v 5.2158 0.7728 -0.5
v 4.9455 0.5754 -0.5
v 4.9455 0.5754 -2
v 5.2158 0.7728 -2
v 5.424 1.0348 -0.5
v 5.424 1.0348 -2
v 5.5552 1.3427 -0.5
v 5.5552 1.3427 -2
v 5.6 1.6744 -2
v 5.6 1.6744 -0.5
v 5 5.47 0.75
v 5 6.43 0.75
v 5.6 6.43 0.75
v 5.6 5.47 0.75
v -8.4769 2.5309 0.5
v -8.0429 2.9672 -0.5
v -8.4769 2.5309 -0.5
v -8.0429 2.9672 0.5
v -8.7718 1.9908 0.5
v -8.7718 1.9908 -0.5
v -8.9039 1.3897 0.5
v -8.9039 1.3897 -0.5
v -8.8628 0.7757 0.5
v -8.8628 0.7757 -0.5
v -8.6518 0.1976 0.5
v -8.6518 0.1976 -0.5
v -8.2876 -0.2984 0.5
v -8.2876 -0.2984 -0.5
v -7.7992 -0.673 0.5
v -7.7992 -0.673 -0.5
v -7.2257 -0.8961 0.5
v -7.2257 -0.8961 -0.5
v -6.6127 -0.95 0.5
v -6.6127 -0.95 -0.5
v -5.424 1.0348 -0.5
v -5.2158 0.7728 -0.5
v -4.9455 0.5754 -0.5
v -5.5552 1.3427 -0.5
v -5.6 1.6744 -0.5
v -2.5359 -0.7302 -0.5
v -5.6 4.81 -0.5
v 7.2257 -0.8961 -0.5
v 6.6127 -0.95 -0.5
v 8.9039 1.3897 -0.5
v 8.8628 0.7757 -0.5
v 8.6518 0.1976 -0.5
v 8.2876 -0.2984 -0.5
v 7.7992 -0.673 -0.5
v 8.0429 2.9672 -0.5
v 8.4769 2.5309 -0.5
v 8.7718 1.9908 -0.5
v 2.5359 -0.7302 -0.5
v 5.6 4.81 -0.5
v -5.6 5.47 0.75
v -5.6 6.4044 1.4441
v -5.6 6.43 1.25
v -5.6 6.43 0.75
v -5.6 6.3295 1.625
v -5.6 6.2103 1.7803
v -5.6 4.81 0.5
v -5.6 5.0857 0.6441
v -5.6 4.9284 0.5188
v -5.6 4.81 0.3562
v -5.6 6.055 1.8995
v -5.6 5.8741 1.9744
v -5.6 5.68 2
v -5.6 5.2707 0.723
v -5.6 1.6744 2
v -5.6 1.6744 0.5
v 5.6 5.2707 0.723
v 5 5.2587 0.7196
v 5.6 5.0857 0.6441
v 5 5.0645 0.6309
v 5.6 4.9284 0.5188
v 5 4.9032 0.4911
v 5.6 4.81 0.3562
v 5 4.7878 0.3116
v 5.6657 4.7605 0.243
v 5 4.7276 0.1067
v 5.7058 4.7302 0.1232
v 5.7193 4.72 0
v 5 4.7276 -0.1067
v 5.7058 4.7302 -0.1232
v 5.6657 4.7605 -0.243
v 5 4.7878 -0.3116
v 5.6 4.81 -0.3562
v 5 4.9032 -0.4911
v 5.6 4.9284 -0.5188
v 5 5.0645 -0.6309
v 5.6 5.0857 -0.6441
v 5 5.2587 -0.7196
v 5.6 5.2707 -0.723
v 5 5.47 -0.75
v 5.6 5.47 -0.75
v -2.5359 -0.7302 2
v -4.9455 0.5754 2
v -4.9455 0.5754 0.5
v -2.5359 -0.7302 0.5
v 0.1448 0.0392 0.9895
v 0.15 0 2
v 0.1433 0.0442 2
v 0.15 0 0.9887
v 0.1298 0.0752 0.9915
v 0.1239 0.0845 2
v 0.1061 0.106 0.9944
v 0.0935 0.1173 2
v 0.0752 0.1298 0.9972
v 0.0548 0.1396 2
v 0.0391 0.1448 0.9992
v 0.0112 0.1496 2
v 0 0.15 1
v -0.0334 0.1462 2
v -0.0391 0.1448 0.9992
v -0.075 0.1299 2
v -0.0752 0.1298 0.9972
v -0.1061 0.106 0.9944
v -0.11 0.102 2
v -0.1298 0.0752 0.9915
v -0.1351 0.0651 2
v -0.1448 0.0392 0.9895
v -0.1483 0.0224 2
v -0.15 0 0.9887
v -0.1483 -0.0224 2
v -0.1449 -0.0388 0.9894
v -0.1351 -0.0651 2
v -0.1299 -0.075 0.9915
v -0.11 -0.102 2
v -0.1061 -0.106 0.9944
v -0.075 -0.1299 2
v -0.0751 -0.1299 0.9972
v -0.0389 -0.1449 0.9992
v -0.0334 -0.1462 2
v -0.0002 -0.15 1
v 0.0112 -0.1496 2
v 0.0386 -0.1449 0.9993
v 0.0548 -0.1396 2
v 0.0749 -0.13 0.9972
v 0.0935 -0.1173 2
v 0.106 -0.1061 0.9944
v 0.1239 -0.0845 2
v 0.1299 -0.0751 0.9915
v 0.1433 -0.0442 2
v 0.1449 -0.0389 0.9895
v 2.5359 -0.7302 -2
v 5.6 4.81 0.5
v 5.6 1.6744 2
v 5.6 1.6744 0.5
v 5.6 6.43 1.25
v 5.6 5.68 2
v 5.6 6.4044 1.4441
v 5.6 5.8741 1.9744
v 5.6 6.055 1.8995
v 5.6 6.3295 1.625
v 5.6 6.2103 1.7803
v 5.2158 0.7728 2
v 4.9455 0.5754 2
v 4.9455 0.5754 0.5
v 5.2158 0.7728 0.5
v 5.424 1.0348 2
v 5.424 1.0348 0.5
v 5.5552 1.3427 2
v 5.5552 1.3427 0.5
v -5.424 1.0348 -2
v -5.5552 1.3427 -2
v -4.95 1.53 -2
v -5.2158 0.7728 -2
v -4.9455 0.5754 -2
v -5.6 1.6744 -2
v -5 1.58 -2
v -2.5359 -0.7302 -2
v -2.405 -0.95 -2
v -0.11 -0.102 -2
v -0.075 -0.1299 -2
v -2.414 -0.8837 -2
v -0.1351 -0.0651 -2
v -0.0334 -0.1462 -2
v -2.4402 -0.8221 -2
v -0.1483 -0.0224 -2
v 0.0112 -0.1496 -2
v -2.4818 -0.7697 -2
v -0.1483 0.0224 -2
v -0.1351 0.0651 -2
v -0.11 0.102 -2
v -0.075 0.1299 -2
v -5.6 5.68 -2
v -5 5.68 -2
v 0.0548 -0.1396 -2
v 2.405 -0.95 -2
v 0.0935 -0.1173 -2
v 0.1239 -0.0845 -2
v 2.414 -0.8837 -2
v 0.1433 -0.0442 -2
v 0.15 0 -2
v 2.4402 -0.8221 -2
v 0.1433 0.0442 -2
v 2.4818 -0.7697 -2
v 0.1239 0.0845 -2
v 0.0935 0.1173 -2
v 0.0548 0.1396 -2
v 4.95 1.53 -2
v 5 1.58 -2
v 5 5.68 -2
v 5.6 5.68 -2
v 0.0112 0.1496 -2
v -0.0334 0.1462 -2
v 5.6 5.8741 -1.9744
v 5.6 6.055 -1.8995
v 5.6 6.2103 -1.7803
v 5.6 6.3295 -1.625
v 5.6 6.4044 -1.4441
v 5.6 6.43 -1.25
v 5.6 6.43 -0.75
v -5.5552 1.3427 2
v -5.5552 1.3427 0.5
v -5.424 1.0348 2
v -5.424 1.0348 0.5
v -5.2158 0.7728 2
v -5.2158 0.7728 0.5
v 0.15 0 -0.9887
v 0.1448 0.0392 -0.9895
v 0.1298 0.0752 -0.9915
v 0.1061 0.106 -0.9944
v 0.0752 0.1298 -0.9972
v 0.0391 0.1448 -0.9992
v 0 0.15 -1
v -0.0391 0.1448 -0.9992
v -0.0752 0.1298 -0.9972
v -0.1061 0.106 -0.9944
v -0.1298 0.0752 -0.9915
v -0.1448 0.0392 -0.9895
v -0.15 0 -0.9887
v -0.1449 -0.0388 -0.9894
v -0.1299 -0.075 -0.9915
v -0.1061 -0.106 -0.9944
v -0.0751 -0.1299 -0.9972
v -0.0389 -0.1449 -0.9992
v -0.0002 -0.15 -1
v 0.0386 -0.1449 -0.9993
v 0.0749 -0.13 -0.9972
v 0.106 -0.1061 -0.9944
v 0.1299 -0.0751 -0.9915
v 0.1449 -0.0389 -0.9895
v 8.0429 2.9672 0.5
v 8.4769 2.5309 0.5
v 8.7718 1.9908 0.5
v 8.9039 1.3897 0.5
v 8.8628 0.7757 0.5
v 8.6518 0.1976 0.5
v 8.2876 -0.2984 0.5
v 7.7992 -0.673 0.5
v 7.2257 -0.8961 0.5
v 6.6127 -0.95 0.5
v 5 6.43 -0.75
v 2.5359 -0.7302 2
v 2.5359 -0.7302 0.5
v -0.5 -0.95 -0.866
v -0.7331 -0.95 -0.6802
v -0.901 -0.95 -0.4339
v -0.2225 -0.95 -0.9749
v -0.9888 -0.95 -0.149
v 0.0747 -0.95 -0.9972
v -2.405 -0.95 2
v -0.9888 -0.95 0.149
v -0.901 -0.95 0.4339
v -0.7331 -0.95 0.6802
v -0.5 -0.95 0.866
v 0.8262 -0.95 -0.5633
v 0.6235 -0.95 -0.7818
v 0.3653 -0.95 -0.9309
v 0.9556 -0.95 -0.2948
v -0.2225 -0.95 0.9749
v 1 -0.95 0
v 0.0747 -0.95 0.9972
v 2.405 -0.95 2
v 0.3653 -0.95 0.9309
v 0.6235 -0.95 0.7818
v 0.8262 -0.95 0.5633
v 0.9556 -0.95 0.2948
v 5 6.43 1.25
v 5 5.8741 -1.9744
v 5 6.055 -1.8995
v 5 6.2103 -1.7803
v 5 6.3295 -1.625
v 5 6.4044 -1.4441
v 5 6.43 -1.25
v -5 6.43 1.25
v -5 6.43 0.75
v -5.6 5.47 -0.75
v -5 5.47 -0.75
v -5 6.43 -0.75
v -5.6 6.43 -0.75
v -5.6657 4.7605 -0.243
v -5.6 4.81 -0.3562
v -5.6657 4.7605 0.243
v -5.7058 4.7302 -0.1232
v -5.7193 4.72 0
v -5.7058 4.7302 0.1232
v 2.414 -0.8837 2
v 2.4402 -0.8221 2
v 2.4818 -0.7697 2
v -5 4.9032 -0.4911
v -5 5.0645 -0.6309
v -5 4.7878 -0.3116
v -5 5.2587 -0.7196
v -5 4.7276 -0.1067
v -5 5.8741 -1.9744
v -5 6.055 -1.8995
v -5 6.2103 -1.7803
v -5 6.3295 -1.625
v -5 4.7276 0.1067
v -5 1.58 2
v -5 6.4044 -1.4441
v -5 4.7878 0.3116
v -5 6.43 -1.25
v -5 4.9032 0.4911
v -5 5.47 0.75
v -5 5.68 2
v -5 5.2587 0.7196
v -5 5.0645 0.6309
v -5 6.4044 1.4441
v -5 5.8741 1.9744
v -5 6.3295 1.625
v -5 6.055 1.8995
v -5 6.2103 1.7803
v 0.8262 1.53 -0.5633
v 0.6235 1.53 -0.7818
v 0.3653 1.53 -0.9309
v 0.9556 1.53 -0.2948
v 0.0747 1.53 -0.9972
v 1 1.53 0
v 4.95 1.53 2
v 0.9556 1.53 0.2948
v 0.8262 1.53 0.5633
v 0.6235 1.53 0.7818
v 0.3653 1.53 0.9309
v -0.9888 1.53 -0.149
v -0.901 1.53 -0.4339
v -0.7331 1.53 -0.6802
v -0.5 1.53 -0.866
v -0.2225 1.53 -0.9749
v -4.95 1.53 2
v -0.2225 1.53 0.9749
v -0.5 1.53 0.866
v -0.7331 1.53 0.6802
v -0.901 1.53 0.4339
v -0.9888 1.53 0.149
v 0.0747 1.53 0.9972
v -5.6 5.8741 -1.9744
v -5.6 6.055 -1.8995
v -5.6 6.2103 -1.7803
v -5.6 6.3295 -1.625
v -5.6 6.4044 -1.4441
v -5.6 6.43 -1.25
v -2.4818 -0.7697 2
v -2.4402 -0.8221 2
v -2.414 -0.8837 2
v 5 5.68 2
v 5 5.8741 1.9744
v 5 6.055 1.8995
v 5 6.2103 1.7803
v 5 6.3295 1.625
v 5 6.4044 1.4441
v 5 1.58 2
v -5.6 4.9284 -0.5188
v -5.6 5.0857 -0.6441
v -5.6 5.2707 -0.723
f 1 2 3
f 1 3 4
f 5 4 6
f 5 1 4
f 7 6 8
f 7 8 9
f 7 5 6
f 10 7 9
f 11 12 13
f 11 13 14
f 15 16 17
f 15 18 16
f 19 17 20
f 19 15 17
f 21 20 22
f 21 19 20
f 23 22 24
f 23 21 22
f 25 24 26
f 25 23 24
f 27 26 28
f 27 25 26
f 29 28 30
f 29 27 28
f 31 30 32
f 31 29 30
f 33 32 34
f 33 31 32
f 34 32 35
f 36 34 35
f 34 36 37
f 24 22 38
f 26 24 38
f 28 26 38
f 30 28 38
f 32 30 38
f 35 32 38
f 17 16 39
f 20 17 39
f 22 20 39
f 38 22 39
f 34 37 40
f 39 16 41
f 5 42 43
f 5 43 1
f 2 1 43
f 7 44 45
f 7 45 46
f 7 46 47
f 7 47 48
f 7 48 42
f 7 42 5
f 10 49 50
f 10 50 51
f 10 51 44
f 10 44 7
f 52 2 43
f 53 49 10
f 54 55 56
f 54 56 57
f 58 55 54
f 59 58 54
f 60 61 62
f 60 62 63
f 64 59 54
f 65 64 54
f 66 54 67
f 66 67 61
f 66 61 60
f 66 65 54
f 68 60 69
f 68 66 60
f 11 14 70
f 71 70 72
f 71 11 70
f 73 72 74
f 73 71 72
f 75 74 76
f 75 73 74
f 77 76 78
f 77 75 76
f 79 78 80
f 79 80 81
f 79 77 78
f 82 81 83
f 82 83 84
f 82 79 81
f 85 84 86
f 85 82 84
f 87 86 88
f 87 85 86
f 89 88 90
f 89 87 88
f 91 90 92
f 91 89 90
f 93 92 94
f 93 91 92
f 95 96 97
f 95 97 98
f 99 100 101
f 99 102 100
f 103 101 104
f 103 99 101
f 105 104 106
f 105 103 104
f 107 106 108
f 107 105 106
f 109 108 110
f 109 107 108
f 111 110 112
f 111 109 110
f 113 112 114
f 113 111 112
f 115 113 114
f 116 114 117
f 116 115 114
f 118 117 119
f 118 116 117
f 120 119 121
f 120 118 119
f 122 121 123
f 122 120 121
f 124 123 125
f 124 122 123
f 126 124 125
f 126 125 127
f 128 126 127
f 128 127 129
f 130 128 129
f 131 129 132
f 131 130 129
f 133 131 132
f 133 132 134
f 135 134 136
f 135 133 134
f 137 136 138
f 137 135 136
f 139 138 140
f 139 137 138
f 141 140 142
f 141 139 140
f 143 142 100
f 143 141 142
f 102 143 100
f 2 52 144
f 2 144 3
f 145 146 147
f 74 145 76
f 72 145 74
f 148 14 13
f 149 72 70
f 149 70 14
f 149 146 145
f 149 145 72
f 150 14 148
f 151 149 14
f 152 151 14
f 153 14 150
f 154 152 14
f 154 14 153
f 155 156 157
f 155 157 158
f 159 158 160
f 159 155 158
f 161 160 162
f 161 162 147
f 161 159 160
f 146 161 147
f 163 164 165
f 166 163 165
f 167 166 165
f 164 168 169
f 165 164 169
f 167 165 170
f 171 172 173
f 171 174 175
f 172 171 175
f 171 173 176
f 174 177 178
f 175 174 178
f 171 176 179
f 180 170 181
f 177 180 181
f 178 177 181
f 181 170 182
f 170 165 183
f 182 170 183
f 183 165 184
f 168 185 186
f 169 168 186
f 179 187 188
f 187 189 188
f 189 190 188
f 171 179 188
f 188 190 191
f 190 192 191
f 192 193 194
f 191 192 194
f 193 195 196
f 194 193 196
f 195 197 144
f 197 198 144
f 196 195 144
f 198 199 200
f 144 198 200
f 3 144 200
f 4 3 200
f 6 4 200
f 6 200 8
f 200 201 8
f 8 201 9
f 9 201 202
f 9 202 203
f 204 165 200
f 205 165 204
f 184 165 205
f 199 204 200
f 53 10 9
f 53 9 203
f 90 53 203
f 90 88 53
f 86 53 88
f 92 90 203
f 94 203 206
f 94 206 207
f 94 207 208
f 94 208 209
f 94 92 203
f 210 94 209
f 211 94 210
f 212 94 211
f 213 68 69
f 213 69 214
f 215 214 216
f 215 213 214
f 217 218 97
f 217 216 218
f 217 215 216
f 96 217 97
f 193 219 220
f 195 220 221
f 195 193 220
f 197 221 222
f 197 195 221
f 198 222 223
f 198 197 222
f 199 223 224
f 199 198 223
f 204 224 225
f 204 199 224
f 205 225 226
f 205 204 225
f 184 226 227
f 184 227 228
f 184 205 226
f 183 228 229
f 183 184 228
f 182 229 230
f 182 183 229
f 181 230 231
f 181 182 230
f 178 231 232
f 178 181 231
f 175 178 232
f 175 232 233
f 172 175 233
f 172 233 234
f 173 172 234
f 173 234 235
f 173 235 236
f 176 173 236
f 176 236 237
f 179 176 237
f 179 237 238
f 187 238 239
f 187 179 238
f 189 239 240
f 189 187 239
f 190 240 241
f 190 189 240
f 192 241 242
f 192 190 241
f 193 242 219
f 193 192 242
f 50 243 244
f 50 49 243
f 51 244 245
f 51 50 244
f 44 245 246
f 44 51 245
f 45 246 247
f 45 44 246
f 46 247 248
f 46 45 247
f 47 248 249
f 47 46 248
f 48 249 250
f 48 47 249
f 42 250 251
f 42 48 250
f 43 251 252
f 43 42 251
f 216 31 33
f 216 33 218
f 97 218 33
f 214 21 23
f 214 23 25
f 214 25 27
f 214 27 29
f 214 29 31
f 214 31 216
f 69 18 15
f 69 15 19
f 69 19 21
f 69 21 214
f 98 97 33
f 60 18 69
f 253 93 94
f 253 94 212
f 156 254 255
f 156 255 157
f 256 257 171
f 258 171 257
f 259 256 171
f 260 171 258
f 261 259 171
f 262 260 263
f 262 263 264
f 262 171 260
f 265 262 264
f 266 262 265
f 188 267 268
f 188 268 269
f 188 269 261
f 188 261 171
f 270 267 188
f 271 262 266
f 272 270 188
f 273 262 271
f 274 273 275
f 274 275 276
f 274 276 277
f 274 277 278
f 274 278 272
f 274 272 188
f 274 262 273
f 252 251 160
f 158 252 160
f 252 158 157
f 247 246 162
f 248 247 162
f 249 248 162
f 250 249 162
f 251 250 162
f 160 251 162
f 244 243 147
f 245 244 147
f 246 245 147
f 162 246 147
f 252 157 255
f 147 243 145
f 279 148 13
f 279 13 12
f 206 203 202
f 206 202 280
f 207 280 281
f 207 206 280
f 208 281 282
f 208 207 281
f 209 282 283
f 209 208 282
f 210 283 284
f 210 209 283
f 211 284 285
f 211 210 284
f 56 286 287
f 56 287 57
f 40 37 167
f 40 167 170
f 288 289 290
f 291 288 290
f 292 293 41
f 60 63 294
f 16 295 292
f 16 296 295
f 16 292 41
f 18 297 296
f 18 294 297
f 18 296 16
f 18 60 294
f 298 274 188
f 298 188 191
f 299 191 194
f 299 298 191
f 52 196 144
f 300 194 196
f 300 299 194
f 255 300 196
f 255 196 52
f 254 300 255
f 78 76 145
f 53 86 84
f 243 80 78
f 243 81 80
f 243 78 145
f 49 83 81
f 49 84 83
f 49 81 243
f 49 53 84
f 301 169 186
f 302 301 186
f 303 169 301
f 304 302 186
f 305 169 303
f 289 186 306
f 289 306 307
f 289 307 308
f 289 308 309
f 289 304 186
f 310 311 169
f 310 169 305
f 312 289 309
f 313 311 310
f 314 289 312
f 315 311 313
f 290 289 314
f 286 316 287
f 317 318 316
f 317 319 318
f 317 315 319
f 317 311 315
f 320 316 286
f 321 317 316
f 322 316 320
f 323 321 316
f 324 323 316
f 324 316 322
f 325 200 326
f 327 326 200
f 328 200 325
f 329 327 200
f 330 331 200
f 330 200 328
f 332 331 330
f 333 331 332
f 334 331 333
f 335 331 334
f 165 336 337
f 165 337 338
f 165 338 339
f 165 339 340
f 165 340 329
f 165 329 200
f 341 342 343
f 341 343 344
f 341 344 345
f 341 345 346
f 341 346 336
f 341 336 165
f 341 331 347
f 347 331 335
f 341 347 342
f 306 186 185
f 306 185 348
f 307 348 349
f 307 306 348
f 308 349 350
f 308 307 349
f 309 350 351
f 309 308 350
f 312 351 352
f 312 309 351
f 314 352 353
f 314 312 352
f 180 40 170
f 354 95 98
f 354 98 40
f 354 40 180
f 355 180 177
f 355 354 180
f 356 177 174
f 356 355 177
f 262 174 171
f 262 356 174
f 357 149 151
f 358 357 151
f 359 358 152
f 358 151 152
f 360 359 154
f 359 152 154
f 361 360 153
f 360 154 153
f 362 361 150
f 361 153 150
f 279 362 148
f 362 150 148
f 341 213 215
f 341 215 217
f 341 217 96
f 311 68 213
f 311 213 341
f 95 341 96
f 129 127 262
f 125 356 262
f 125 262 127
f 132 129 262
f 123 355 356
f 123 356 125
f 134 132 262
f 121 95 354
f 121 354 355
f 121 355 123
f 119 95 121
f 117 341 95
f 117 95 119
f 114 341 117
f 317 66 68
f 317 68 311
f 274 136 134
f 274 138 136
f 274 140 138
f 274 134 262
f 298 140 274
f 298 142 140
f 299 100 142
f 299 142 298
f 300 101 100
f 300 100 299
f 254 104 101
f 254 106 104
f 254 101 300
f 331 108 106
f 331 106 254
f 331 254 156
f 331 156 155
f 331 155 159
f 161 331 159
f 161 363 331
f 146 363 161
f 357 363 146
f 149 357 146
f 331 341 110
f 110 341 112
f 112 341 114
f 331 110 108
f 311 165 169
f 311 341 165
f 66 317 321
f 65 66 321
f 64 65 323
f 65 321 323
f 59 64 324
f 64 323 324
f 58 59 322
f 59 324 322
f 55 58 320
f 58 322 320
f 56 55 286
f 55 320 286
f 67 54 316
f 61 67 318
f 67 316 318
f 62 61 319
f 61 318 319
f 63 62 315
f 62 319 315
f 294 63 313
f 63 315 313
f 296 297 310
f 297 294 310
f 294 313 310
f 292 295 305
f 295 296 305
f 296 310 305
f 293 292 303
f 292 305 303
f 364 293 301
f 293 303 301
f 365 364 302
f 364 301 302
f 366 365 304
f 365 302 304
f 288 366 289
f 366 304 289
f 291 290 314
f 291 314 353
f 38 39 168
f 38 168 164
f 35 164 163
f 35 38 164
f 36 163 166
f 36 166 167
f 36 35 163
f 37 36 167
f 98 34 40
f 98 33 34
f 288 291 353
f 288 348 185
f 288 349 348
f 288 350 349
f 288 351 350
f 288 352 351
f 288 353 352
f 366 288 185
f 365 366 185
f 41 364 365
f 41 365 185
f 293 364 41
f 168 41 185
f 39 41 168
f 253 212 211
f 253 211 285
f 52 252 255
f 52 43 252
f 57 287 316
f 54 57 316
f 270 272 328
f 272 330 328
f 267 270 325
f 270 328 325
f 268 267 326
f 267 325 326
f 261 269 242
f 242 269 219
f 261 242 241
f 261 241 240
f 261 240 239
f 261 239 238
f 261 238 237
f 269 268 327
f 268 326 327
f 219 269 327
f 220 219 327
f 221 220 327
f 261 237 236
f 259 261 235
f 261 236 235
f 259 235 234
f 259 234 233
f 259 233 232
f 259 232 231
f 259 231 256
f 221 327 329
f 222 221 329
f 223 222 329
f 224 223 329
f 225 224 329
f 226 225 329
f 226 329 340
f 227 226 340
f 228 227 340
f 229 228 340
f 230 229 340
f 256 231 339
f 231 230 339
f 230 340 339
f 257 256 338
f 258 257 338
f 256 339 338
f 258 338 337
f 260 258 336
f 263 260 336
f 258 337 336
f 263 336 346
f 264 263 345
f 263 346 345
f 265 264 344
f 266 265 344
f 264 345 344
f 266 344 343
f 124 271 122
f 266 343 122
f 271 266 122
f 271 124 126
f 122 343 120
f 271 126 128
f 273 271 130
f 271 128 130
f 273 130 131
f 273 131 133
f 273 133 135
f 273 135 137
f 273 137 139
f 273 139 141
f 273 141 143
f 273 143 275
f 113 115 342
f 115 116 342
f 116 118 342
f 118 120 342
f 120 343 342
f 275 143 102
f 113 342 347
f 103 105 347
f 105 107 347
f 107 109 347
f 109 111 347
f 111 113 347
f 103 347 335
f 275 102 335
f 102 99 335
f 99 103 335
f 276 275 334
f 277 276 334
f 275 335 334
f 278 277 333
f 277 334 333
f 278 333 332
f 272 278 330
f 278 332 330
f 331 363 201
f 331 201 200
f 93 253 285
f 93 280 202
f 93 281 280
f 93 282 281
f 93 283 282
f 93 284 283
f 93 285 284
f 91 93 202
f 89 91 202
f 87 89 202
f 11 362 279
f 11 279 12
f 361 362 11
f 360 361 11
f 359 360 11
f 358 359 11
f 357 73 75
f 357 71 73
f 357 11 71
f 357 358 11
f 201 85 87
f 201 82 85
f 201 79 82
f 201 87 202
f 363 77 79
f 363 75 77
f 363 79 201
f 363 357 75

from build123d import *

# Parameters (mm, degrees)
SKETCH1_R               = 0.15
BOSS_EXTRUDE1_DEPTH     = 2
BOSS_EXTRUDE3_DEPTH     = 0.5
CUT_EXTRUDE1_DEPTH      = 9.910022596
CUT_EXTRUDE1_DEPTH_BACK = 9.910022596
CUT_EXTRUDE2_DEPTH      = 4.310022596
CUT_EXTRUDE2_DEPTH_BACK = 15.510022596
SKETCH6_R               = 1
CUT_EXTRUDE3_DEPTH      = 7.43
CUT_EXTRUDE3_DEPTH_BACK = 1.953161862


with BuildPart() as part:
    # Sketch1 → Boss-Extrude1 (new body, symmetric)
    with BuildSketch(Plane.XY):
        with BuildLine():
            Line((-2.405, -0.95), (2.405, -0.95))
            ThreePointArc((2.405, -0.95), (2.440204468, -0.822082529), (2.535903035, -0.73019119))
            Line((2.535903035, -0.73019119), (4.945484826, 0.575370124))
            ThreePointArc((4.945484826, 0.575370124), (5.423977661, 1.034826819), (5.6, 1.674414174))
            Line((5.6, 1.674414174), (5.6, 6.43))
            Line((5.6, 6.43), (5, 6.43))
            Line((5, 6.43), (5, 1.58))
            Line((5, 1.58), (4.95, 1.53))
            Line((4.95, 1.53), (-4.95, 1.53))
            Line((-4.95, 1.53), (-5, 1.58))
            Line((-5, 1.58), (-5, 6.43))
            Line((-5, 6.43), (-5.6, 6.43))
            Line((-5.6, 6.43), (-5.6, 1.674414174))
            ThreePointArc((-5.6, 1.674414174), (-5.423977661, 1.034826819), (-4.945484826, 0.575370124))
            Line((-4.945484826, 0.575370124), (-2.535903035, -0.73019119))
            ThreePointArc((-2.535903035, -0.73019119), (-2.440204468, -0.822082529), (-2.405, -0.95))
        make_face()
        Circle(SKETCH1_R, mode=Mode.SUBTRACT)
    extrude(amount=BOSS_EXTRUDE1_DEPTH, both=True)

    # Sketch2 → Boss-Extrude3 (add, symmetric)
    with BuildSketch(Plane.XY):
        with BuildLine():
            Line((2.535903035, -0.73019119), (4.945484826, 0.575370124))
            ThreePointArc((4.945484826, 0.575370124), (5.423977661, 1.034826819), (5.6, 1.674414174))
            Line((5.6, 1.674414174), (5.6, 4.81))
            Line((5.6, 4.81), (8.042875866, 2.967187611))
            ThreePointArc((8.042875866, 2.967187611), (8.777798155, 0.479164908), (6.61265257, -0.95))
            Line((6.61265257, -0.95), (2.535903035, -0.73019119))
        make_face()
        with BuildLine():
            Line((-2.535903035, -0.73019119), (-4.945484826, 0.575370124))
            ThreePointArc((-4.945484826, 0.575370124), (-5.423977661, 1.034826819), (-5.6, 1.674414174))
            Line((-5.6, 1.674414174), (-5.6, 4.81))
            Line((-5.6, 4.81), (-8.042875866, 2.967187611))
            ThreePointArc((-8.042875866, 2.967187611), (-8.777798155, 0.479164908), (-6.61265257, -0.95))
            Line((-6.61265257, -0.95), (-2.535903035, -0.73019119))
        make_face()
    extrude(amount=BOSS_EXTRUDE3_DEPTH, both=True)

    # Sketch4 → Cut-Extrude1 (cut, two sides)
    with BuildSketch(Plane(origin=(0, 0, 0), x_dir=(0, 0, -1), z_dir=(1, 0, 0))) as cut_extrude1_sk:
        with BuildLine():
            Line((0.75, 5.47), (0.75, 6.97))
            Line((0.75, 6.97), (-0.75, 6.97))
            Line((-0.75, 6.97), (-0.75, 5.47))
            ThreePointArc((-0.75, 5.47), (0, 4.72), (0.75, 5.47))
        make_face()
    extrude(amount=CUT_EXTRUDE1_DEPTH, mode=Mode.SUBTRACT)
    extrude(cut_extrude1_sk.sketch, amount=-CUT_EXTRUDE1_DEPTH_BACK, mode=Mode.SUBTRACT)

    # Sketch5 → Cut-Extrude2 (cut, two sides)
    with BuildSketch(Plane(origin=(5.6, 0, 0), x_dir=(0, 0, -1), z_dir=(1, 0, 0))) as cut_extrude2_sk:
        with BuildLine():
            Line((2, 6.43), (2, 5.68))
            ThreePointArc((2, 5.68), (1.780330086, 6.210330086), (1.25, 6.43))
            Line((1.25, 6.43), (2, 6.43))
        make_face()
        with BuildLine():
            Line((-2, 6.43), (-2, 5.68))
            ThreePointArc((-2, 5.68), (-1.780330086, 6.210330086), (-1.25, 6.43))
            Line((-1.25, 6.43), (-2, 6.43))
        make_face()
    extrude(amount=CUT_EXTRUDE2_DEPTH, mode=Mode.SUBTRACT)
    extrude(cut_extrude2_sk.sketch, amount=-CUT_EXTRUDE2_DEPTH_BACK, mode=Mode.SUBTRACT)

    # Sketch6 → Cut-Extrude3 (cut, two sides)
    with BuildSketch(Plane(origin=(0, 0, 0), x_dir=(1, 0, 0), z_dir=(0, 1, 0))) as cut_extrude3_sk:
        Circle(SKETCH6_R)
    extrude(amount=CUT_EXTRUDE3_DEPTH, mode=Mode.SUBTRACT)
    extrude(cut_extrude3_sk.sketch, amount=-CUT_EXTRUDE3_DEPTH_BACK, mode=Mode.SUBTRACT)


solid = part.part
